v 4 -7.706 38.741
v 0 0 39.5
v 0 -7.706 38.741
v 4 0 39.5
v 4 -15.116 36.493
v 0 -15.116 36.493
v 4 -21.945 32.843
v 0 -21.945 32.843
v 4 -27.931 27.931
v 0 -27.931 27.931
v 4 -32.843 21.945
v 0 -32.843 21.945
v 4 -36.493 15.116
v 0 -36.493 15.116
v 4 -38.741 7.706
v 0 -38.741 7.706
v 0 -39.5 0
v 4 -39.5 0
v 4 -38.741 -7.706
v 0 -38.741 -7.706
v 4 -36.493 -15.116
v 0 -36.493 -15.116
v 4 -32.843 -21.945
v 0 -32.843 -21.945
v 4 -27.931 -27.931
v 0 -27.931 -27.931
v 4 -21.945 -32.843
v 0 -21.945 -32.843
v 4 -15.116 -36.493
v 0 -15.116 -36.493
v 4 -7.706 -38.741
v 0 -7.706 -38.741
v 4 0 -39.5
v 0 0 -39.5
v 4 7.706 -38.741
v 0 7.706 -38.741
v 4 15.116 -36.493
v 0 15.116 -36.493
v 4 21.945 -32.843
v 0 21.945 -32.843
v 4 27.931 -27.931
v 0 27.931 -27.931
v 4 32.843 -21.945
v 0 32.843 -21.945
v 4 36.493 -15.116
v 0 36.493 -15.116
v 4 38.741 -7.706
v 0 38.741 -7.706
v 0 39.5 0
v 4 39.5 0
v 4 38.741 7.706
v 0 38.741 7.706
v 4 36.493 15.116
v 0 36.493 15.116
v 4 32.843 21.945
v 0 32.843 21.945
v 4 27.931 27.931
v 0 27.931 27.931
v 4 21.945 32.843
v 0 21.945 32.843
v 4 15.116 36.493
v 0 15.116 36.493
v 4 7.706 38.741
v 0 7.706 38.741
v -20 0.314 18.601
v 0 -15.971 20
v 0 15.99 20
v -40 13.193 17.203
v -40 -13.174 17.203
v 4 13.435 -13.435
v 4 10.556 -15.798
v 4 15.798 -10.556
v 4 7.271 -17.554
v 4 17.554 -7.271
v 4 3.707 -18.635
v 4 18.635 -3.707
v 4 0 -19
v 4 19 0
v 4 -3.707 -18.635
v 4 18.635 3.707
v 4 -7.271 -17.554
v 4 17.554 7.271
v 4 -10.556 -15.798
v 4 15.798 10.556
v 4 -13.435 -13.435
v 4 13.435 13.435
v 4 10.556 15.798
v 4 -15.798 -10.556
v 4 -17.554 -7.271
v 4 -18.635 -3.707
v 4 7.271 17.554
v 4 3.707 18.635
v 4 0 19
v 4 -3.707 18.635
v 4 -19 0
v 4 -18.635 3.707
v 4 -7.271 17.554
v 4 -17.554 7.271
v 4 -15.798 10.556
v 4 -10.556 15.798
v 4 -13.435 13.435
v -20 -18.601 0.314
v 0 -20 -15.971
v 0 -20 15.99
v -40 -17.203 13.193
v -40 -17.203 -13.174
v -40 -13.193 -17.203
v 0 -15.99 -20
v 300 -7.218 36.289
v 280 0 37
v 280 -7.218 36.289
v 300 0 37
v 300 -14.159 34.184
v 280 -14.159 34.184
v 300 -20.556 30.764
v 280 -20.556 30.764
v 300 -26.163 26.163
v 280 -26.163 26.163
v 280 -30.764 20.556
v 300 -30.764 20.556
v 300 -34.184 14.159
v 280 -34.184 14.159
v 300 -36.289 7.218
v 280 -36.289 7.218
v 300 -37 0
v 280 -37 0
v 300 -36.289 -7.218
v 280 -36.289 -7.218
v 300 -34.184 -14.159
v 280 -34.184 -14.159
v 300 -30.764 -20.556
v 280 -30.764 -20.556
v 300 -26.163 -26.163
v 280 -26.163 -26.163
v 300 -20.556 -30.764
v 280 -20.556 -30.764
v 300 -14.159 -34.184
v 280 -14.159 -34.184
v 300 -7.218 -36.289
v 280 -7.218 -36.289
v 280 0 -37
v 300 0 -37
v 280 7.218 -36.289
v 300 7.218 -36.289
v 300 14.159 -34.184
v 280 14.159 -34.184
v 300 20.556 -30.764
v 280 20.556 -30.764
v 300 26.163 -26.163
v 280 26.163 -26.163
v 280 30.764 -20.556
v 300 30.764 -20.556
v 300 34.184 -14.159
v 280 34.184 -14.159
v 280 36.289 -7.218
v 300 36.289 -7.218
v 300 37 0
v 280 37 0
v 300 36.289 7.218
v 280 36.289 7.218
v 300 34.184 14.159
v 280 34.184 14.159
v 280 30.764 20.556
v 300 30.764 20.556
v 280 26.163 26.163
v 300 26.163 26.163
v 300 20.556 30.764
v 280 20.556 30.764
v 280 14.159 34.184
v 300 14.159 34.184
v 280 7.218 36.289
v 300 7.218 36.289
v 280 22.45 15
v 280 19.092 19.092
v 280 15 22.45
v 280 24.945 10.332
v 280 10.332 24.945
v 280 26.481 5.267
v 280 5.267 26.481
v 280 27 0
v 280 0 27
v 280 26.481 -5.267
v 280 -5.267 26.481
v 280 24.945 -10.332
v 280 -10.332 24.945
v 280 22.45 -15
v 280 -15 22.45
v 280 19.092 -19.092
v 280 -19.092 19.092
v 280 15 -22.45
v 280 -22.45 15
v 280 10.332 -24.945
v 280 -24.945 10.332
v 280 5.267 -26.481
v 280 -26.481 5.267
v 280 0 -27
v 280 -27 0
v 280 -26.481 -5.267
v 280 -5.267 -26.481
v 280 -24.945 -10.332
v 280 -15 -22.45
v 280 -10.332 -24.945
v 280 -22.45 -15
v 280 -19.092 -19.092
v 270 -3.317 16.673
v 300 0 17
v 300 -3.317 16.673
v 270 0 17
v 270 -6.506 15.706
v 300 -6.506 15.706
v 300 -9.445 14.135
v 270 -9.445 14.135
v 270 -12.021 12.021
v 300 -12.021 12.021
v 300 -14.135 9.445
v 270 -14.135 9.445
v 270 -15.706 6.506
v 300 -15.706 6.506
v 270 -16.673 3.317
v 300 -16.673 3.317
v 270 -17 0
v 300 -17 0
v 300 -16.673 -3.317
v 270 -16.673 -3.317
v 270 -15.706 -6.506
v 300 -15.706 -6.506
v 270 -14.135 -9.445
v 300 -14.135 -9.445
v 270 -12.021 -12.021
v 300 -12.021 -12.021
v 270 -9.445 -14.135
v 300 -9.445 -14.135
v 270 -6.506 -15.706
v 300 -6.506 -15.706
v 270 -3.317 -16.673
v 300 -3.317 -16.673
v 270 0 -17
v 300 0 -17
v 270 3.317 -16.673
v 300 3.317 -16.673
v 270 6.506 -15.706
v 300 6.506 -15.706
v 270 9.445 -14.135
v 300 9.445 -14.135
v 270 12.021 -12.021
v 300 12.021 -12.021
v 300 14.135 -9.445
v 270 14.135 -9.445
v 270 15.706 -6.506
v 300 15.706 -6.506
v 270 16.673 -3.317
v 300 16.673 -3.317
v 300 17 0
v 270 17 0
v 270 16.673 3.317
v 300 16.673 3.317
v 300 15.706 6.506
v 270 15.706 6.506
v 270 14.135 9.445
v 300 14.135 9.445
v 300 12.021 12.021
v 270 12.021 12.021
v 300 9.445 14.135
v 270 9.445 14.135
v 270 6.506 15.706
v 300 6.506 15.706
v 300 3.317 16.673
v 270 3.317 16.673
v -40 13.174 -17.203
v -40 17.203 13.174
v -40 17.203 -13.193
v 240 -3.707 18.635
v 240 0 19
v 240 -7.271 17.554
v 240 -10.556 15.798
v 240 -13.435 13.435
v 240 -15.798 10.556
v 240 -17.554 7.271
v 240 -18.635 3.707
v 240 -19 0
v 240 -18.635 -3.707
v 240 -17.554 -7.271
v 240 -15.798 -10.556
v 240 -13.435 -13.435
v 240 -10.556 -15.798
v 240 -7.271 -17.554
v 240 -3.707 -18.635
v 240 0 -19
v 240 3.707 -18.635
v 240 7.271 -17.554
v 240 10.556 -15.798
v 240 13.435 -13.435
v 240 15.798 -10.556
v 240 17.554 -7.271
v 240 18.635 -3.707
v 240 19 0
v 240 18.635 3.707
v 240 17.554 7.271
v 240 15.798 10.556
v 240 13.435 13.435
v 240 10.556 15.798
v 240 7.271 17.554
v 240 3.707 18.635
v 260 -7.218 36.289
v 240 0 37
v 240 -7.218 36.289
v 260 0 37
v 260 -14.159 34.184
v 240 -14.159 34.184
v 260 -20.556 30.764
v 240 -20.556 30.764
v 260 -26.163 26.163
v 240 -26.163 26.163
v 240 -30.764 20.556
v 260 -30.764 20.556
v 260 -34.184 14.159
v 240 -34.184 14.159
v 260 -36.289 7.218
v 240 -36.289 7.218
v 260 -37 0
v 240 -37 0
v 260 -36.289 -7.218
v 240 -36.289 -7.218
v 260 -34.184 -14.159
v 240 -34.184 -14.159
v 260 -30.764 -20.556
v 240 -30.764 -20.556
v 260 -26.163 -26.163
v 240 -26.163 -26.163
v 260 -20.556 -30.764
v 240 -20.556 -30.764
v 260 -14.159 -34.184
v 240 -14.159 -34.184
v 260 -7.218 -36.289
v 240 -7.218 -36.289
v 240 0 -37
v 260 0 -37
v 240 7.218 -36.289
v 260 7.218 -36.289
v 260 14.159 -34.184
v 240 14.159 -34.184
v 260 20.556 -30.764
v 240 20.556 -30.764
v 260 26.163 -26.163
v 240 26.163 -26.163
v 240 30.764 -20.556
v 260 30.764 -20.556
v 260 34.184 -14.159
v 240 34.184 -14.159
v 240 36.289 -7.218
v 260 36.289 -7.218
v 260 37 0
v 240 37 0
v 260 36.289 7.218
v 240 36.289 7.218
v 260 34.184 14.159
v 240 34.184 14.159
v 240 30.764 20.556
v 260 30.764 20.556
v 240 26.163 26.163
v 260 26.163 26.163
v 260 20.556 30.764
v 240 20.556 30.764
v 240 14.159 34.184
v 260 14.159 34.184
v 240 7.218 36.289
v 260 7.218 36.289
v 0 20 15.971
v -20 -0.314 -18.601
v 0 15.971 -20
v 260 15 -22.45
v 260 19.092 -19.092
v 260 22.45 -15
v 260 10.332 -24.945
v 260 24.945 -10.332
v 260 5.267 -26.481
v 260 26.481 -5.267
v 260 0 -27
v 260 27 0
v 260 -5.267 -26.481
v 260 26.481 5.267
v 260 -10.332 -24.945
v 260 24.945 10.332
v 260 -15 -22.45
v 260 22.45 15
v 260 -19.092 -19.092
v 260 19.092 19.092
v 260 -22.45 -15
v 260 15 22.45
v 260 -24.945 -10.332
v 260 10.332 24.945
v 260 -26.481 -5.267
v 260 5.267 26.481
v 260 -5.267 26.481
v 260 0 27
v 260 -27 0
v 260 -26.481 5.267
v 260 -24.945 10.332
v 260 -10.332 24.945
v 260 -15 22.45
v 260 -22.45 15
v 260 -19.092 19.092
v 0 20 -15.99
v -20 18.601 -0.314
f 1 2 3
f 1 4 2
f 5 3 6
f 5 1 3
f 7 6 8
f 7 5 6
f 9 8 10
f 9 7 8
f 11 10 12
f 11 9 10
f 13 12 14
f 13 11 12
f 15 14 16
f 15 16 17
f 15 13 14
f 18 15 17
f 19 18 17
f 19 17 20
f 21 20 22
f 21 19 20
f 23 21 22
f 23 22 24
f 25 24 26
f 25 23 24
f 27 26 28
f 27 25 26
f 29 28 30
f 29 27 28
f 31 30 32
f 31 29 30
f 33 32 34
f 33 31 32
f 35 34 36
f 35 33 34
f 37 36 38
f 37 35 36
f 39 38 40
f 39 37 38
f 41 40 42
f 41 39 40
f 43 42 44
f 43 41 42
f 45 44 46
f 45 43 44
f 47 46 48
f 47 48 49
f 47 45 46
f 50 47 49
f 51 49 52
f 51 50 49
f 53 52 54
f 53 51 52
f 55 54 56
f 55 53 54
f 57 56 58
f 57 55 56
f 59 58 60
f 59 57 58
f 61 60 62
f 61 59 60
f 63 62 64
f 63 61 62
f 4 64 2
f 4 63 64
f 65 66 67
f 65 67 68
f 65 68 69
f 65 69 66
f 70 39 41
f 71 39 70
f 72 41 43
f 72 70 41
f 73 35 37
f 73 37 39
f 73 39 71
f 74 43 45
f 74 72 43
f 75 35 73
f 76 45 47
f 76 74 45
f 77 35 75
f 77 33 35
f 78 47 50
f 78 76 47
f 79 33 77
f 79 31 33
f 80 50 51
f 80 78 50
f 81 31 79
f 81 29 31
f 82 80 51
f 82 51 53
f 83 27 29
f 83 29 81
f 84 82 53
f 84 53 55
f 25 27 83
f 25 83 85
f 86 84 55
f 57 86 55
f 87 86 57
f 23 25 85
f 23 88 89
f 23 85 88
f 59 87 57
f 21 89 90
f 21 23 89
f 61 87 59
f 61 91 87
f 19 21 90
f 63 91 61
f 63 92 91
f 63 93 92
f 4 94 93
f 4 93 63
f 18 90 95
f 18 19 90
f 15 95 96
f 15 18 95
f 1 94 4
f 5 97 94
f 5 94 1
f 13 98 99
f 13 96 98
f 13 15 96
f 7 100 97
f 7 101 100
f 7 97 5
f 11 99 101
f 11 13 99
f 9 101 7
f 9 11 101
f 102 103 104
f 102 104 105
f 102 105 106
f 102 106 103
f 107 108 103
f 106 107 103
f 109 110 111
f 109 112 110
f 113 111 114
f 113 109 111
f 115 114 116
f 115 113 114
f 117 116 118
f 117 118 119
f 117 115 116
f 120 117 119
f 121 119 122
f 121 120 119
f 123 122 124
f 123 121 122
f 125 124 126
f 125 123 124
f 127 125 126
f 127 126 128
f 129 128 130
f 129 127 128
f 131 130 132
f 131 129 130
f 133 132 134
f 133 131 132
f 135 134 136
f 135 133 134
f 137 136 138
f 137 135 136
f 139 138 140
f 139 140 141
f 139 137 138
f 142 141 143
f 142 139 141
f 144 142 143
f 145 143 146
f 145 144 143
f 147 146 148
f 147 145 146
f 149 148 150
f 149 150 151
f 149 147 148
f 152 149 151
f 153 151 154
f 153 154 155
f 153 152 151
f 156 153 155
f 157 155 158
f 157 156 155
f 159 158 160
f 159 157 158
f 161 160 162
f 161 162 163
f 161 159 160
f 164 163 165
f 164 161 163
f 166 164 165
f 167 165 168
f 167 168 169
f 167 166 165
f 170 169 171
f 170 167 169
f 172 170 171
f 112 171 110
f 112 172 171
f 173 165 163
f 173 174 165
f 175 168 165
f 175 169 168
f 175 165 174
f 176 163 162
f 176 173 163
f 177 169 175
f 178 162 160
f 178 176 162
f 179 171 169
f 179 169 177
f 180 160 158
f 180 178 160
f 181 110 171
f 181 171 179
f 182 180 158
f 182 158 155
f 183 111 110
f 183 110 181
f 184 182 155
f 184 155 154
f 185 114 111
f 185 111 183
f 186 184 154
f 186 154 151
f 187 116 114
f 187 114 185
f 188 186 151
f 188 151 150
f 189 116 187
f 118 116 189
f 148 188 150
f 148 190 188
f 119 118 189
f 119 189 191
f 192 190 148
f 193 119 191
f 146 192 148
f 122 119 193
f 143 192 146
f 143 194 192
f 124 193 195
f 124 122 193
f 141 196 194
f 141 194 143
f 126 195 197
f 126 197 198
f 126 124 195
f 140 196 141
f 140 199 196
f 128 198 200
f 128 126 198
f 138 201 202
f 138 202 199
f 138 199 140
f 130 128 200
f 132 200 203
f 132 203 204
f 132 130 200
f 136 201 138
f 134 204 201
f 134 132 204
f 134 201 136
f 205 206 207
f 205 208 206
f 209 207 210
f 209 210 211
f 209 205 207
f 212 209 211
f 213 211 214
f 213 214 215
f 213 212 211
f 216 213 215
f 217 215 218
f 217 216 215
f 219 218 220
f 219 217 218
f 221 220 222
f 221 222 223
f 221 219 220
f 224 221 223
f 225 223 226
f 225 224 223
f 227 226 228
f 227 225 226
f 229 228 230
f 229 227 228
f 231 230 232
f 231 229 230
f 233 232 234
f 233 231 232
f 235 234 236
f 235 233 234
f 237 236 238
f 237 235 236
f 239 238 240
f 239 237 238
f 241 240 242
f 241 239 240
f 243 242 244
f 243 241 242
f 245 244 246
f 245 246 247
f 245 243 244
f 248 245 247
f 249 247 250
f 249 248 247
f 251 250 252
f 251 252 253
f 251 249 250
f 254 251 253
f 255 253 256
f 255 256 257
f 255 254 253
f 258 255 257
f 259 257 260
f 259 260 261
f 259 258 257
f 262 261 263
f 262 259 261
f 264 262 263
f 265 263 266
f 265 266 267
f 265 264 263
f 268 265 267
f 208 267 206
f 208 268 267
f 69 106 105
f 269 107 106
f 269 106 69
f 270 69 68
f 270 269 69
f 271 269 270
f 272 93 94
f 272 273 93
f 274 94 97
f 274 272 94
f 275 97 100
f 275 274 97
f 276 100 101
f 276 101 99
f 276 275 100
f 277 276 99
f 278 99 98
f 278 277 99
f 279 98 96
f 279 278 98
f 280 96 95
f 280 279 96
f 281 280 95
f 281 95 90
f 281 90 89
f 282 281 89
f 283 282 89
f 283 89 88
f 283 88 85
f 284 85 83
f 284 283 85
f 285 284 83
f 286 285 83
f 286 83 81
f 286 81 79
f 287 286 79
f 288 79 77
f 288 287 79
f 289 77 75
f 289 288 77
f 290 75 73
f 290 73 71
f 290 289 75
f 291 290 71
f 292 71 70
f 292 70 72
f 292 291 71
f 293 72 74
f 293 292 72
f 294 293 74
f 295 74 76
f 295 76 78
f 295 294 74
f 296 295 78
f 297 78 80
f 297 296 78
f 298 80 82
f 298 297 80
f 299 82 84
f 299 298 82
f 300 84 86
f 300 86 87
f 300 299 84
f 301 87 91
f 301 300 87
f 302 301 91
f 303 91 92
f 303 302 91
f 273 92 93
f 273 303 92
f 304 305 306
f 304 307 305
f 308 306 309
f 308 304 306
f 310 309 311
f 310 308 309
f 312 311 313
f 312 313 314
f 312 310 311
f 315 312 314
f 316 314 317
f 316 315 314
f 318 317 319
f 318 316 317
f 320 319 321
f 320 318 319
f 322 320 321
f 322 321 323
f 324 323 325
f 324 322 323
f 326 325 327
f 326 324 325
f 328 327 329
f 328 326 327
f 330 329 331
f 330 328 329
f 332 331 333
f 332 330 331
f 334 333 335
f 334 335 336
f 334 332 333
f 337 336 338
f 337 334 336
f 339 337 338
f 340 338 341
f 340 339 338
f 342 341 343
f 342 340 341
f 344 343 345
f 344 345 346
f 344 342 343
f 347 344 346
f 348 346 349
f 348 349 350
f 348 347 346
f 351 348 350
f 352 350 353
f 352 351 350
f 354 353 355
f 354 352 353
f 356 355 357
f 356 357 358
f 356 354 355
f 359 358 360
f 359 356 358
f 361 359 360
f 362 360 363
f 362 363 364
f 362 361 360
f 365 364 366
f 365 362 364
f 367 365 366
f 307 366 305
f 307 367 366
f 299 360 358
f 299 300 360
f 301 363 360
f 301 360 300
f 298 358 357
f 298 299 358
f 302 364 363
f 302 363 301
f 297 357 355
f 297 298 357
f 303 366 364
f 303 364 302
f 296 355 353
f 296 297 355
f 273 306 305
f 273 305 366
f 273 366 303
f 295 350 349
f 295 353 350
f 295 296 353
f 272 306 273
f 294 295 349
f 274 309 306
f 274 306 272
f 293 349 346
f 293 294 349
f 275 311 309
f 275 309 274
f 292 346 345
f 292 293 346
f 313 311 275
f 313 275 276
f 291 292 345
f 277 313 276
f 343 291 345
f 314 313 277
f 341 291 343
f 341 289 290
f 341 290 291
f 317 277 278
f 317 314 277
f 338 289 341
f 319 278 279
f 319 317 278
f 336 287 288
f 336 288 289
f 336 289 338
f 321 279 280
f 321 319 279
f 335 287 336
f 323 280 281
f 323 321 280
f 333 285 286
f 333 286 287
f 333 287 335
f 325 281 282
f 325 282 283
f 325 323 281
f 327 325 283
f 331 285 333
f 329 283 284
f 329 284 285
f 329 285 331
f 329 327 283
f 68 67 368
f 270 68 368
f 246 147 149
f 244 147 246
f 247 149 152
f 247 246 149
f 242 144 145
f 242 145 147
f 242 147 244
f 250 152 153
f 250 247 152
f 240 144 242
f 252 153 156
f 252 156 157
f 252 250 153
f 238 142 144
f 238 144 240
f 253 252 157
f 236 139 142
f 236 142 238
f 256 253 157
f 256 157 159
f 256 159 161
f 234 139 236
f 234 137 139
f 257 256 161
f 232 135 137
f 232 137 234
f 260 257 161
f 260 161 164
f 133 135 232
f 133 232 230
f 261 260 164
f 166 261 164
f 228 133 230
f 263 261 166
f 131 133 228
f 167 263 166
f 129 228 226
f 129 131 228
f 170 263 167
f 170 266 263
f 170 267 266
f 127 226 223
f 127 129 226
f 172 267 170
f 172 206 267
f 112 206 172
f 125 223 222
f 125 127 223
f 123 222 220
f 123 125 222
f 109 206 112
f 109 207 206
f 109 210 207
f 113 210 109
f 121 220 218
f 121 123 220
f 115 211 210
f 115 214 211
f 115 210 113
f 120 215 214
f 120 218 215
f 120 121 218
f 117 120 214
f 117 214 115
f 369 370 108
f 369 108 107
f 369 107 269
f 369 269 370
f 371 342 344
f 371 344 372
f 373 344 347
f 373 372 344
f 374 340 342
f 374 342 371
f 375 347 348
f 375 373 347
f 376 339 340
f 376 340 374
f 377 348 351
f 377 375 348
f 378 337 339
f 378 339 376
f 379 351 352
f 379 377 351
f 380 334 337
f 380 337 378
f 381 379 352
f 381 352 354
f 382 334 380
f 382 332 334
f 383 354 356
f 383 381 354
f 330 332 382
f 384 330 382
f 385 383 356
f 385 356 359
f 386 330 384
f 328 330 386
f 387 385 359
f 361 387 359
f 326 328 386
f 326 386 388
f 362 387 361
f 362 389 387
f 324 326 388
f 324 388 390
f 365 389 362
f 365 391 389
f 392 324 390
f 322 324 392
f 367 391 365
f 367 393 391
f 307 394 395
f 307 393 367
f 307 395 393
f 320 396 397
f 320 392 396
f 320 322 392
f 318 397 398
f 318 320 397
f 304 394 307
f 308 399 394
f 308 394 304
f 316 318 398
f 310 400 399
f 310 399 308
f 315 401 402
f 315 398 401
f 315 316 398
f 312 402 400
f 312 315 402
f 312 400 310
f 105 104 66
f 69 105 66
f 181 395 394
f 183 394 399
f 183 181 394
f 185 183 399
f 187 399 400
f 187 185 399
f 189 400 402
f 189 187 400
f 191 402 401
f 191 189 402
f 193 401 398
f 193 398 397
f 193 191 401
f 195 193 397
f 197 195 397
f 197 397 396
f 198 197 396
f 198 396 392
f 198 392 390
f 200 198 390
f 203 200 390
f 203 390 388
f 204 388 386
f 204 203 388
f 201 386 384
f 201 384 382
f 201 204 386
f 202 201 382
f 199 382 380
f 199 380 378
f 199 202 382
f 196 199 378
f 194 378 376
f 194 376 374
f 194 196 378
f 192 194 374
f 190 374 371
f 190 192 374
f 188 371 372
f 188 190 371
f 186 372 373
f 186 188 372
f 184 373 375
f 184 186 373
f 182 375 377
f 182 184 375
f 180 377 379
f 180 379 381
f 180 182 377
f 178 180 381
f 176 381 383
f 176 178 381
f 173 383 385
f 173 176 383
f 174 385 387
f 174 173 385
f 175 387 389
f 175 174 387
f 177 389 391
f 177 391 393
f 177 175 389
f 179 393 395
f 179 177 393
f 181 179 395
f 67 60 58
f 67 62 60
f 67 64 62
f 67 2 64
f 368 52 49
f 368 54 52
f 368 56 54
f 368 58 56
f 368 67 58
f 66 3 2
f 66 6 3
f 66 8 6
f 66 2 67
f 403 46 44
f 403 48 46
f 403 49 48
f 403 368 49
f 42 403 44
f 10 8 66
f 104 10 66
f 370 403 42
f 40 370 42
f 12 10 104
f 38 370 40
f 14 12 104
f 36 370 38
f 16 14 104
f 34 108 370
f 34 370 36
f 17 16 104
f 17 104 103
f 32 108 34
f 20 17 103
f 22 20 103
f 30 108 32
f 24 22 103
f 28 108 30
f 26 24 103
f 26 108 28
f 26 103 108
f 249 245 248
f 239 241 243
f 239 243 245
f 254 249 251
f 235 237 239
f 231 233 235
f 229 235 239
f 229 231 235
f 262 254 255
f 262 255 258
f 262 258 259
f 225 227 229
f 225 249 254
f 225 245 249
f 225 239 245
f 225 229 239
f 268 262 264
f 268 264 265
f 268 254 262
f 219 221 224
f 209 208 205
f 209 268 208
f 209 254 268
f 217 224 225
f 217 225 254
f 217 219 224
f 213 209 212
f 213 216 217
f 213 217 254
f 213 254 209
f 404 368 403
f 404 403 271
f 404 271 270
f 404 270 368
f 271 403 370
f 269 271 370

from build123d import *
from OCP.BRepFilletAPI import BRepFilletAPI_MakeChamfer

# Parameters (mm, degrees)
ESQUISSE2_W        = 40
ESQUISSE2_H        = 40
BOSS_EXTRU_1_DEPTH = 40
BOSS_EXTRU_1_TAPER = 4
CHANFREIN1_SIZE    = 4
CHANFREIN1_SIZE2   = 4.019606856


with BuildPart() as part:
    # Esquisse1 → Révolution1 (revolve)
    with BuildSketch(Plane.XY, mode=Mode.PRIVATE) as r_volution1_sk:
        Polygon((0, 0), (0, 39.5), (4, 39.5), (4, 19), (240, 19), (240, 37), (260, 37), (260, 27), (280, 27), (280, 37), (300, 37), (300, 17), (270, 17), (270, 0), align=None)
    revolve(r_volution1_sk.sketch.rotate(Axis((0, 0, 0), (1, 0, 0)), 90), axis=Axis((0, 0, 0), (1, 0, 0)))

    # Esquisse2 → Boss.-Extru.1 (add)
    with BuildSketch(Plane.ZY):
        Rectangle(ESQUISSE2_W, ESQUISSE2_H)
    extrude(amount=BOSS_EXTRU_1_DEPTH, taper=BOSS_EXTRU_1_TAPER)

    # Chanfrein1: one chamfer whose edges measure the first distance from different faces: ONE call of the kernel's chamfer builder (chamfer() names one face for all edges)
    chanfrein1_edges_1 = [part.edges().sort_by_distance(p)[0] for p in [
        (-20, 18.601463761, -18.601463761),
    ]]
    chanfrein1_side_1 = [part.faces().sort_by_distance(p)[0] for p in [
        (-19.498771976, 18.636513039, 0),
    ]]
    chanfrein1_edges_2 = [part.edges().sort_by_distance(p)[0] for p in [
        (-20, -18.601463761, -18.601463761),
    ]]
    chanfrein1_side_2 = [part.faces().sort_by_distance(p)[0] for p in [
        (-19.498771976, 0, -18.636513039),
    ]]
    chanfrein1_edges_3 = [part.edges().sort_by_distance(p)[0] for p in [
        (-20, -18.601463761, 18.601463761),
    ]]
    chanfrein1_side_3 = [part.faces().sort_by_distance(p)[0] for p in [
        (-19.498771976, -18.636513039, 0),
    ]]
    chanfrein1_edges_4 = [part.edges().sort_by_distance(p)[0] for p in [
        (-20, 18.601463761, 18.601463761),
    ]]
    chanfrein1_side_4 = [part.faces().sort_by_distance(p)[0] for p in [
        (-19.498771976, 0, 18.636513039),
    ]]
    chanfrein1 = BRepFilletAPI_MakeChamfer(part.part.solid().wrapped)
    for e in chanfrein1_edges_1:
        chanfrein1.Add(CHANFREIN1_SIZE, CHANFREIN1_SIZE2, e.wrapped, chanfrein1_side_1[0].wrapped)  # the first distance lies on this face
    for e in chanfrein1_edges_2:
        chanfrein1.Add(CHANFREIN1_SIZE, CHANFREIN1_SIZE2, e.wrapped, chanfrein1_side_2[0].wrapped)  # the first distance lies on this face
    for e in chanfrein1_edges_3:
        chanfrein1.Add(CHANFREIN1_SIZE, CHANFREIN1_SIZE2, e.wrapped, chanfrein1_side_3[0].wrapped)  # the first distance lies on this face
    for e in chanfrein1_edges_4:
        chanfrein1.Add(CHANFREIN1_SIZE, CHANFREIN1_SIZE2, e.wrapped, chanfrein1_side_4[0].wrapped)  # the first distance lies on this face
    add(Compound.cast(chanfrein1.Shape()), mode=Mode.REPLACE)


solid = part.part
